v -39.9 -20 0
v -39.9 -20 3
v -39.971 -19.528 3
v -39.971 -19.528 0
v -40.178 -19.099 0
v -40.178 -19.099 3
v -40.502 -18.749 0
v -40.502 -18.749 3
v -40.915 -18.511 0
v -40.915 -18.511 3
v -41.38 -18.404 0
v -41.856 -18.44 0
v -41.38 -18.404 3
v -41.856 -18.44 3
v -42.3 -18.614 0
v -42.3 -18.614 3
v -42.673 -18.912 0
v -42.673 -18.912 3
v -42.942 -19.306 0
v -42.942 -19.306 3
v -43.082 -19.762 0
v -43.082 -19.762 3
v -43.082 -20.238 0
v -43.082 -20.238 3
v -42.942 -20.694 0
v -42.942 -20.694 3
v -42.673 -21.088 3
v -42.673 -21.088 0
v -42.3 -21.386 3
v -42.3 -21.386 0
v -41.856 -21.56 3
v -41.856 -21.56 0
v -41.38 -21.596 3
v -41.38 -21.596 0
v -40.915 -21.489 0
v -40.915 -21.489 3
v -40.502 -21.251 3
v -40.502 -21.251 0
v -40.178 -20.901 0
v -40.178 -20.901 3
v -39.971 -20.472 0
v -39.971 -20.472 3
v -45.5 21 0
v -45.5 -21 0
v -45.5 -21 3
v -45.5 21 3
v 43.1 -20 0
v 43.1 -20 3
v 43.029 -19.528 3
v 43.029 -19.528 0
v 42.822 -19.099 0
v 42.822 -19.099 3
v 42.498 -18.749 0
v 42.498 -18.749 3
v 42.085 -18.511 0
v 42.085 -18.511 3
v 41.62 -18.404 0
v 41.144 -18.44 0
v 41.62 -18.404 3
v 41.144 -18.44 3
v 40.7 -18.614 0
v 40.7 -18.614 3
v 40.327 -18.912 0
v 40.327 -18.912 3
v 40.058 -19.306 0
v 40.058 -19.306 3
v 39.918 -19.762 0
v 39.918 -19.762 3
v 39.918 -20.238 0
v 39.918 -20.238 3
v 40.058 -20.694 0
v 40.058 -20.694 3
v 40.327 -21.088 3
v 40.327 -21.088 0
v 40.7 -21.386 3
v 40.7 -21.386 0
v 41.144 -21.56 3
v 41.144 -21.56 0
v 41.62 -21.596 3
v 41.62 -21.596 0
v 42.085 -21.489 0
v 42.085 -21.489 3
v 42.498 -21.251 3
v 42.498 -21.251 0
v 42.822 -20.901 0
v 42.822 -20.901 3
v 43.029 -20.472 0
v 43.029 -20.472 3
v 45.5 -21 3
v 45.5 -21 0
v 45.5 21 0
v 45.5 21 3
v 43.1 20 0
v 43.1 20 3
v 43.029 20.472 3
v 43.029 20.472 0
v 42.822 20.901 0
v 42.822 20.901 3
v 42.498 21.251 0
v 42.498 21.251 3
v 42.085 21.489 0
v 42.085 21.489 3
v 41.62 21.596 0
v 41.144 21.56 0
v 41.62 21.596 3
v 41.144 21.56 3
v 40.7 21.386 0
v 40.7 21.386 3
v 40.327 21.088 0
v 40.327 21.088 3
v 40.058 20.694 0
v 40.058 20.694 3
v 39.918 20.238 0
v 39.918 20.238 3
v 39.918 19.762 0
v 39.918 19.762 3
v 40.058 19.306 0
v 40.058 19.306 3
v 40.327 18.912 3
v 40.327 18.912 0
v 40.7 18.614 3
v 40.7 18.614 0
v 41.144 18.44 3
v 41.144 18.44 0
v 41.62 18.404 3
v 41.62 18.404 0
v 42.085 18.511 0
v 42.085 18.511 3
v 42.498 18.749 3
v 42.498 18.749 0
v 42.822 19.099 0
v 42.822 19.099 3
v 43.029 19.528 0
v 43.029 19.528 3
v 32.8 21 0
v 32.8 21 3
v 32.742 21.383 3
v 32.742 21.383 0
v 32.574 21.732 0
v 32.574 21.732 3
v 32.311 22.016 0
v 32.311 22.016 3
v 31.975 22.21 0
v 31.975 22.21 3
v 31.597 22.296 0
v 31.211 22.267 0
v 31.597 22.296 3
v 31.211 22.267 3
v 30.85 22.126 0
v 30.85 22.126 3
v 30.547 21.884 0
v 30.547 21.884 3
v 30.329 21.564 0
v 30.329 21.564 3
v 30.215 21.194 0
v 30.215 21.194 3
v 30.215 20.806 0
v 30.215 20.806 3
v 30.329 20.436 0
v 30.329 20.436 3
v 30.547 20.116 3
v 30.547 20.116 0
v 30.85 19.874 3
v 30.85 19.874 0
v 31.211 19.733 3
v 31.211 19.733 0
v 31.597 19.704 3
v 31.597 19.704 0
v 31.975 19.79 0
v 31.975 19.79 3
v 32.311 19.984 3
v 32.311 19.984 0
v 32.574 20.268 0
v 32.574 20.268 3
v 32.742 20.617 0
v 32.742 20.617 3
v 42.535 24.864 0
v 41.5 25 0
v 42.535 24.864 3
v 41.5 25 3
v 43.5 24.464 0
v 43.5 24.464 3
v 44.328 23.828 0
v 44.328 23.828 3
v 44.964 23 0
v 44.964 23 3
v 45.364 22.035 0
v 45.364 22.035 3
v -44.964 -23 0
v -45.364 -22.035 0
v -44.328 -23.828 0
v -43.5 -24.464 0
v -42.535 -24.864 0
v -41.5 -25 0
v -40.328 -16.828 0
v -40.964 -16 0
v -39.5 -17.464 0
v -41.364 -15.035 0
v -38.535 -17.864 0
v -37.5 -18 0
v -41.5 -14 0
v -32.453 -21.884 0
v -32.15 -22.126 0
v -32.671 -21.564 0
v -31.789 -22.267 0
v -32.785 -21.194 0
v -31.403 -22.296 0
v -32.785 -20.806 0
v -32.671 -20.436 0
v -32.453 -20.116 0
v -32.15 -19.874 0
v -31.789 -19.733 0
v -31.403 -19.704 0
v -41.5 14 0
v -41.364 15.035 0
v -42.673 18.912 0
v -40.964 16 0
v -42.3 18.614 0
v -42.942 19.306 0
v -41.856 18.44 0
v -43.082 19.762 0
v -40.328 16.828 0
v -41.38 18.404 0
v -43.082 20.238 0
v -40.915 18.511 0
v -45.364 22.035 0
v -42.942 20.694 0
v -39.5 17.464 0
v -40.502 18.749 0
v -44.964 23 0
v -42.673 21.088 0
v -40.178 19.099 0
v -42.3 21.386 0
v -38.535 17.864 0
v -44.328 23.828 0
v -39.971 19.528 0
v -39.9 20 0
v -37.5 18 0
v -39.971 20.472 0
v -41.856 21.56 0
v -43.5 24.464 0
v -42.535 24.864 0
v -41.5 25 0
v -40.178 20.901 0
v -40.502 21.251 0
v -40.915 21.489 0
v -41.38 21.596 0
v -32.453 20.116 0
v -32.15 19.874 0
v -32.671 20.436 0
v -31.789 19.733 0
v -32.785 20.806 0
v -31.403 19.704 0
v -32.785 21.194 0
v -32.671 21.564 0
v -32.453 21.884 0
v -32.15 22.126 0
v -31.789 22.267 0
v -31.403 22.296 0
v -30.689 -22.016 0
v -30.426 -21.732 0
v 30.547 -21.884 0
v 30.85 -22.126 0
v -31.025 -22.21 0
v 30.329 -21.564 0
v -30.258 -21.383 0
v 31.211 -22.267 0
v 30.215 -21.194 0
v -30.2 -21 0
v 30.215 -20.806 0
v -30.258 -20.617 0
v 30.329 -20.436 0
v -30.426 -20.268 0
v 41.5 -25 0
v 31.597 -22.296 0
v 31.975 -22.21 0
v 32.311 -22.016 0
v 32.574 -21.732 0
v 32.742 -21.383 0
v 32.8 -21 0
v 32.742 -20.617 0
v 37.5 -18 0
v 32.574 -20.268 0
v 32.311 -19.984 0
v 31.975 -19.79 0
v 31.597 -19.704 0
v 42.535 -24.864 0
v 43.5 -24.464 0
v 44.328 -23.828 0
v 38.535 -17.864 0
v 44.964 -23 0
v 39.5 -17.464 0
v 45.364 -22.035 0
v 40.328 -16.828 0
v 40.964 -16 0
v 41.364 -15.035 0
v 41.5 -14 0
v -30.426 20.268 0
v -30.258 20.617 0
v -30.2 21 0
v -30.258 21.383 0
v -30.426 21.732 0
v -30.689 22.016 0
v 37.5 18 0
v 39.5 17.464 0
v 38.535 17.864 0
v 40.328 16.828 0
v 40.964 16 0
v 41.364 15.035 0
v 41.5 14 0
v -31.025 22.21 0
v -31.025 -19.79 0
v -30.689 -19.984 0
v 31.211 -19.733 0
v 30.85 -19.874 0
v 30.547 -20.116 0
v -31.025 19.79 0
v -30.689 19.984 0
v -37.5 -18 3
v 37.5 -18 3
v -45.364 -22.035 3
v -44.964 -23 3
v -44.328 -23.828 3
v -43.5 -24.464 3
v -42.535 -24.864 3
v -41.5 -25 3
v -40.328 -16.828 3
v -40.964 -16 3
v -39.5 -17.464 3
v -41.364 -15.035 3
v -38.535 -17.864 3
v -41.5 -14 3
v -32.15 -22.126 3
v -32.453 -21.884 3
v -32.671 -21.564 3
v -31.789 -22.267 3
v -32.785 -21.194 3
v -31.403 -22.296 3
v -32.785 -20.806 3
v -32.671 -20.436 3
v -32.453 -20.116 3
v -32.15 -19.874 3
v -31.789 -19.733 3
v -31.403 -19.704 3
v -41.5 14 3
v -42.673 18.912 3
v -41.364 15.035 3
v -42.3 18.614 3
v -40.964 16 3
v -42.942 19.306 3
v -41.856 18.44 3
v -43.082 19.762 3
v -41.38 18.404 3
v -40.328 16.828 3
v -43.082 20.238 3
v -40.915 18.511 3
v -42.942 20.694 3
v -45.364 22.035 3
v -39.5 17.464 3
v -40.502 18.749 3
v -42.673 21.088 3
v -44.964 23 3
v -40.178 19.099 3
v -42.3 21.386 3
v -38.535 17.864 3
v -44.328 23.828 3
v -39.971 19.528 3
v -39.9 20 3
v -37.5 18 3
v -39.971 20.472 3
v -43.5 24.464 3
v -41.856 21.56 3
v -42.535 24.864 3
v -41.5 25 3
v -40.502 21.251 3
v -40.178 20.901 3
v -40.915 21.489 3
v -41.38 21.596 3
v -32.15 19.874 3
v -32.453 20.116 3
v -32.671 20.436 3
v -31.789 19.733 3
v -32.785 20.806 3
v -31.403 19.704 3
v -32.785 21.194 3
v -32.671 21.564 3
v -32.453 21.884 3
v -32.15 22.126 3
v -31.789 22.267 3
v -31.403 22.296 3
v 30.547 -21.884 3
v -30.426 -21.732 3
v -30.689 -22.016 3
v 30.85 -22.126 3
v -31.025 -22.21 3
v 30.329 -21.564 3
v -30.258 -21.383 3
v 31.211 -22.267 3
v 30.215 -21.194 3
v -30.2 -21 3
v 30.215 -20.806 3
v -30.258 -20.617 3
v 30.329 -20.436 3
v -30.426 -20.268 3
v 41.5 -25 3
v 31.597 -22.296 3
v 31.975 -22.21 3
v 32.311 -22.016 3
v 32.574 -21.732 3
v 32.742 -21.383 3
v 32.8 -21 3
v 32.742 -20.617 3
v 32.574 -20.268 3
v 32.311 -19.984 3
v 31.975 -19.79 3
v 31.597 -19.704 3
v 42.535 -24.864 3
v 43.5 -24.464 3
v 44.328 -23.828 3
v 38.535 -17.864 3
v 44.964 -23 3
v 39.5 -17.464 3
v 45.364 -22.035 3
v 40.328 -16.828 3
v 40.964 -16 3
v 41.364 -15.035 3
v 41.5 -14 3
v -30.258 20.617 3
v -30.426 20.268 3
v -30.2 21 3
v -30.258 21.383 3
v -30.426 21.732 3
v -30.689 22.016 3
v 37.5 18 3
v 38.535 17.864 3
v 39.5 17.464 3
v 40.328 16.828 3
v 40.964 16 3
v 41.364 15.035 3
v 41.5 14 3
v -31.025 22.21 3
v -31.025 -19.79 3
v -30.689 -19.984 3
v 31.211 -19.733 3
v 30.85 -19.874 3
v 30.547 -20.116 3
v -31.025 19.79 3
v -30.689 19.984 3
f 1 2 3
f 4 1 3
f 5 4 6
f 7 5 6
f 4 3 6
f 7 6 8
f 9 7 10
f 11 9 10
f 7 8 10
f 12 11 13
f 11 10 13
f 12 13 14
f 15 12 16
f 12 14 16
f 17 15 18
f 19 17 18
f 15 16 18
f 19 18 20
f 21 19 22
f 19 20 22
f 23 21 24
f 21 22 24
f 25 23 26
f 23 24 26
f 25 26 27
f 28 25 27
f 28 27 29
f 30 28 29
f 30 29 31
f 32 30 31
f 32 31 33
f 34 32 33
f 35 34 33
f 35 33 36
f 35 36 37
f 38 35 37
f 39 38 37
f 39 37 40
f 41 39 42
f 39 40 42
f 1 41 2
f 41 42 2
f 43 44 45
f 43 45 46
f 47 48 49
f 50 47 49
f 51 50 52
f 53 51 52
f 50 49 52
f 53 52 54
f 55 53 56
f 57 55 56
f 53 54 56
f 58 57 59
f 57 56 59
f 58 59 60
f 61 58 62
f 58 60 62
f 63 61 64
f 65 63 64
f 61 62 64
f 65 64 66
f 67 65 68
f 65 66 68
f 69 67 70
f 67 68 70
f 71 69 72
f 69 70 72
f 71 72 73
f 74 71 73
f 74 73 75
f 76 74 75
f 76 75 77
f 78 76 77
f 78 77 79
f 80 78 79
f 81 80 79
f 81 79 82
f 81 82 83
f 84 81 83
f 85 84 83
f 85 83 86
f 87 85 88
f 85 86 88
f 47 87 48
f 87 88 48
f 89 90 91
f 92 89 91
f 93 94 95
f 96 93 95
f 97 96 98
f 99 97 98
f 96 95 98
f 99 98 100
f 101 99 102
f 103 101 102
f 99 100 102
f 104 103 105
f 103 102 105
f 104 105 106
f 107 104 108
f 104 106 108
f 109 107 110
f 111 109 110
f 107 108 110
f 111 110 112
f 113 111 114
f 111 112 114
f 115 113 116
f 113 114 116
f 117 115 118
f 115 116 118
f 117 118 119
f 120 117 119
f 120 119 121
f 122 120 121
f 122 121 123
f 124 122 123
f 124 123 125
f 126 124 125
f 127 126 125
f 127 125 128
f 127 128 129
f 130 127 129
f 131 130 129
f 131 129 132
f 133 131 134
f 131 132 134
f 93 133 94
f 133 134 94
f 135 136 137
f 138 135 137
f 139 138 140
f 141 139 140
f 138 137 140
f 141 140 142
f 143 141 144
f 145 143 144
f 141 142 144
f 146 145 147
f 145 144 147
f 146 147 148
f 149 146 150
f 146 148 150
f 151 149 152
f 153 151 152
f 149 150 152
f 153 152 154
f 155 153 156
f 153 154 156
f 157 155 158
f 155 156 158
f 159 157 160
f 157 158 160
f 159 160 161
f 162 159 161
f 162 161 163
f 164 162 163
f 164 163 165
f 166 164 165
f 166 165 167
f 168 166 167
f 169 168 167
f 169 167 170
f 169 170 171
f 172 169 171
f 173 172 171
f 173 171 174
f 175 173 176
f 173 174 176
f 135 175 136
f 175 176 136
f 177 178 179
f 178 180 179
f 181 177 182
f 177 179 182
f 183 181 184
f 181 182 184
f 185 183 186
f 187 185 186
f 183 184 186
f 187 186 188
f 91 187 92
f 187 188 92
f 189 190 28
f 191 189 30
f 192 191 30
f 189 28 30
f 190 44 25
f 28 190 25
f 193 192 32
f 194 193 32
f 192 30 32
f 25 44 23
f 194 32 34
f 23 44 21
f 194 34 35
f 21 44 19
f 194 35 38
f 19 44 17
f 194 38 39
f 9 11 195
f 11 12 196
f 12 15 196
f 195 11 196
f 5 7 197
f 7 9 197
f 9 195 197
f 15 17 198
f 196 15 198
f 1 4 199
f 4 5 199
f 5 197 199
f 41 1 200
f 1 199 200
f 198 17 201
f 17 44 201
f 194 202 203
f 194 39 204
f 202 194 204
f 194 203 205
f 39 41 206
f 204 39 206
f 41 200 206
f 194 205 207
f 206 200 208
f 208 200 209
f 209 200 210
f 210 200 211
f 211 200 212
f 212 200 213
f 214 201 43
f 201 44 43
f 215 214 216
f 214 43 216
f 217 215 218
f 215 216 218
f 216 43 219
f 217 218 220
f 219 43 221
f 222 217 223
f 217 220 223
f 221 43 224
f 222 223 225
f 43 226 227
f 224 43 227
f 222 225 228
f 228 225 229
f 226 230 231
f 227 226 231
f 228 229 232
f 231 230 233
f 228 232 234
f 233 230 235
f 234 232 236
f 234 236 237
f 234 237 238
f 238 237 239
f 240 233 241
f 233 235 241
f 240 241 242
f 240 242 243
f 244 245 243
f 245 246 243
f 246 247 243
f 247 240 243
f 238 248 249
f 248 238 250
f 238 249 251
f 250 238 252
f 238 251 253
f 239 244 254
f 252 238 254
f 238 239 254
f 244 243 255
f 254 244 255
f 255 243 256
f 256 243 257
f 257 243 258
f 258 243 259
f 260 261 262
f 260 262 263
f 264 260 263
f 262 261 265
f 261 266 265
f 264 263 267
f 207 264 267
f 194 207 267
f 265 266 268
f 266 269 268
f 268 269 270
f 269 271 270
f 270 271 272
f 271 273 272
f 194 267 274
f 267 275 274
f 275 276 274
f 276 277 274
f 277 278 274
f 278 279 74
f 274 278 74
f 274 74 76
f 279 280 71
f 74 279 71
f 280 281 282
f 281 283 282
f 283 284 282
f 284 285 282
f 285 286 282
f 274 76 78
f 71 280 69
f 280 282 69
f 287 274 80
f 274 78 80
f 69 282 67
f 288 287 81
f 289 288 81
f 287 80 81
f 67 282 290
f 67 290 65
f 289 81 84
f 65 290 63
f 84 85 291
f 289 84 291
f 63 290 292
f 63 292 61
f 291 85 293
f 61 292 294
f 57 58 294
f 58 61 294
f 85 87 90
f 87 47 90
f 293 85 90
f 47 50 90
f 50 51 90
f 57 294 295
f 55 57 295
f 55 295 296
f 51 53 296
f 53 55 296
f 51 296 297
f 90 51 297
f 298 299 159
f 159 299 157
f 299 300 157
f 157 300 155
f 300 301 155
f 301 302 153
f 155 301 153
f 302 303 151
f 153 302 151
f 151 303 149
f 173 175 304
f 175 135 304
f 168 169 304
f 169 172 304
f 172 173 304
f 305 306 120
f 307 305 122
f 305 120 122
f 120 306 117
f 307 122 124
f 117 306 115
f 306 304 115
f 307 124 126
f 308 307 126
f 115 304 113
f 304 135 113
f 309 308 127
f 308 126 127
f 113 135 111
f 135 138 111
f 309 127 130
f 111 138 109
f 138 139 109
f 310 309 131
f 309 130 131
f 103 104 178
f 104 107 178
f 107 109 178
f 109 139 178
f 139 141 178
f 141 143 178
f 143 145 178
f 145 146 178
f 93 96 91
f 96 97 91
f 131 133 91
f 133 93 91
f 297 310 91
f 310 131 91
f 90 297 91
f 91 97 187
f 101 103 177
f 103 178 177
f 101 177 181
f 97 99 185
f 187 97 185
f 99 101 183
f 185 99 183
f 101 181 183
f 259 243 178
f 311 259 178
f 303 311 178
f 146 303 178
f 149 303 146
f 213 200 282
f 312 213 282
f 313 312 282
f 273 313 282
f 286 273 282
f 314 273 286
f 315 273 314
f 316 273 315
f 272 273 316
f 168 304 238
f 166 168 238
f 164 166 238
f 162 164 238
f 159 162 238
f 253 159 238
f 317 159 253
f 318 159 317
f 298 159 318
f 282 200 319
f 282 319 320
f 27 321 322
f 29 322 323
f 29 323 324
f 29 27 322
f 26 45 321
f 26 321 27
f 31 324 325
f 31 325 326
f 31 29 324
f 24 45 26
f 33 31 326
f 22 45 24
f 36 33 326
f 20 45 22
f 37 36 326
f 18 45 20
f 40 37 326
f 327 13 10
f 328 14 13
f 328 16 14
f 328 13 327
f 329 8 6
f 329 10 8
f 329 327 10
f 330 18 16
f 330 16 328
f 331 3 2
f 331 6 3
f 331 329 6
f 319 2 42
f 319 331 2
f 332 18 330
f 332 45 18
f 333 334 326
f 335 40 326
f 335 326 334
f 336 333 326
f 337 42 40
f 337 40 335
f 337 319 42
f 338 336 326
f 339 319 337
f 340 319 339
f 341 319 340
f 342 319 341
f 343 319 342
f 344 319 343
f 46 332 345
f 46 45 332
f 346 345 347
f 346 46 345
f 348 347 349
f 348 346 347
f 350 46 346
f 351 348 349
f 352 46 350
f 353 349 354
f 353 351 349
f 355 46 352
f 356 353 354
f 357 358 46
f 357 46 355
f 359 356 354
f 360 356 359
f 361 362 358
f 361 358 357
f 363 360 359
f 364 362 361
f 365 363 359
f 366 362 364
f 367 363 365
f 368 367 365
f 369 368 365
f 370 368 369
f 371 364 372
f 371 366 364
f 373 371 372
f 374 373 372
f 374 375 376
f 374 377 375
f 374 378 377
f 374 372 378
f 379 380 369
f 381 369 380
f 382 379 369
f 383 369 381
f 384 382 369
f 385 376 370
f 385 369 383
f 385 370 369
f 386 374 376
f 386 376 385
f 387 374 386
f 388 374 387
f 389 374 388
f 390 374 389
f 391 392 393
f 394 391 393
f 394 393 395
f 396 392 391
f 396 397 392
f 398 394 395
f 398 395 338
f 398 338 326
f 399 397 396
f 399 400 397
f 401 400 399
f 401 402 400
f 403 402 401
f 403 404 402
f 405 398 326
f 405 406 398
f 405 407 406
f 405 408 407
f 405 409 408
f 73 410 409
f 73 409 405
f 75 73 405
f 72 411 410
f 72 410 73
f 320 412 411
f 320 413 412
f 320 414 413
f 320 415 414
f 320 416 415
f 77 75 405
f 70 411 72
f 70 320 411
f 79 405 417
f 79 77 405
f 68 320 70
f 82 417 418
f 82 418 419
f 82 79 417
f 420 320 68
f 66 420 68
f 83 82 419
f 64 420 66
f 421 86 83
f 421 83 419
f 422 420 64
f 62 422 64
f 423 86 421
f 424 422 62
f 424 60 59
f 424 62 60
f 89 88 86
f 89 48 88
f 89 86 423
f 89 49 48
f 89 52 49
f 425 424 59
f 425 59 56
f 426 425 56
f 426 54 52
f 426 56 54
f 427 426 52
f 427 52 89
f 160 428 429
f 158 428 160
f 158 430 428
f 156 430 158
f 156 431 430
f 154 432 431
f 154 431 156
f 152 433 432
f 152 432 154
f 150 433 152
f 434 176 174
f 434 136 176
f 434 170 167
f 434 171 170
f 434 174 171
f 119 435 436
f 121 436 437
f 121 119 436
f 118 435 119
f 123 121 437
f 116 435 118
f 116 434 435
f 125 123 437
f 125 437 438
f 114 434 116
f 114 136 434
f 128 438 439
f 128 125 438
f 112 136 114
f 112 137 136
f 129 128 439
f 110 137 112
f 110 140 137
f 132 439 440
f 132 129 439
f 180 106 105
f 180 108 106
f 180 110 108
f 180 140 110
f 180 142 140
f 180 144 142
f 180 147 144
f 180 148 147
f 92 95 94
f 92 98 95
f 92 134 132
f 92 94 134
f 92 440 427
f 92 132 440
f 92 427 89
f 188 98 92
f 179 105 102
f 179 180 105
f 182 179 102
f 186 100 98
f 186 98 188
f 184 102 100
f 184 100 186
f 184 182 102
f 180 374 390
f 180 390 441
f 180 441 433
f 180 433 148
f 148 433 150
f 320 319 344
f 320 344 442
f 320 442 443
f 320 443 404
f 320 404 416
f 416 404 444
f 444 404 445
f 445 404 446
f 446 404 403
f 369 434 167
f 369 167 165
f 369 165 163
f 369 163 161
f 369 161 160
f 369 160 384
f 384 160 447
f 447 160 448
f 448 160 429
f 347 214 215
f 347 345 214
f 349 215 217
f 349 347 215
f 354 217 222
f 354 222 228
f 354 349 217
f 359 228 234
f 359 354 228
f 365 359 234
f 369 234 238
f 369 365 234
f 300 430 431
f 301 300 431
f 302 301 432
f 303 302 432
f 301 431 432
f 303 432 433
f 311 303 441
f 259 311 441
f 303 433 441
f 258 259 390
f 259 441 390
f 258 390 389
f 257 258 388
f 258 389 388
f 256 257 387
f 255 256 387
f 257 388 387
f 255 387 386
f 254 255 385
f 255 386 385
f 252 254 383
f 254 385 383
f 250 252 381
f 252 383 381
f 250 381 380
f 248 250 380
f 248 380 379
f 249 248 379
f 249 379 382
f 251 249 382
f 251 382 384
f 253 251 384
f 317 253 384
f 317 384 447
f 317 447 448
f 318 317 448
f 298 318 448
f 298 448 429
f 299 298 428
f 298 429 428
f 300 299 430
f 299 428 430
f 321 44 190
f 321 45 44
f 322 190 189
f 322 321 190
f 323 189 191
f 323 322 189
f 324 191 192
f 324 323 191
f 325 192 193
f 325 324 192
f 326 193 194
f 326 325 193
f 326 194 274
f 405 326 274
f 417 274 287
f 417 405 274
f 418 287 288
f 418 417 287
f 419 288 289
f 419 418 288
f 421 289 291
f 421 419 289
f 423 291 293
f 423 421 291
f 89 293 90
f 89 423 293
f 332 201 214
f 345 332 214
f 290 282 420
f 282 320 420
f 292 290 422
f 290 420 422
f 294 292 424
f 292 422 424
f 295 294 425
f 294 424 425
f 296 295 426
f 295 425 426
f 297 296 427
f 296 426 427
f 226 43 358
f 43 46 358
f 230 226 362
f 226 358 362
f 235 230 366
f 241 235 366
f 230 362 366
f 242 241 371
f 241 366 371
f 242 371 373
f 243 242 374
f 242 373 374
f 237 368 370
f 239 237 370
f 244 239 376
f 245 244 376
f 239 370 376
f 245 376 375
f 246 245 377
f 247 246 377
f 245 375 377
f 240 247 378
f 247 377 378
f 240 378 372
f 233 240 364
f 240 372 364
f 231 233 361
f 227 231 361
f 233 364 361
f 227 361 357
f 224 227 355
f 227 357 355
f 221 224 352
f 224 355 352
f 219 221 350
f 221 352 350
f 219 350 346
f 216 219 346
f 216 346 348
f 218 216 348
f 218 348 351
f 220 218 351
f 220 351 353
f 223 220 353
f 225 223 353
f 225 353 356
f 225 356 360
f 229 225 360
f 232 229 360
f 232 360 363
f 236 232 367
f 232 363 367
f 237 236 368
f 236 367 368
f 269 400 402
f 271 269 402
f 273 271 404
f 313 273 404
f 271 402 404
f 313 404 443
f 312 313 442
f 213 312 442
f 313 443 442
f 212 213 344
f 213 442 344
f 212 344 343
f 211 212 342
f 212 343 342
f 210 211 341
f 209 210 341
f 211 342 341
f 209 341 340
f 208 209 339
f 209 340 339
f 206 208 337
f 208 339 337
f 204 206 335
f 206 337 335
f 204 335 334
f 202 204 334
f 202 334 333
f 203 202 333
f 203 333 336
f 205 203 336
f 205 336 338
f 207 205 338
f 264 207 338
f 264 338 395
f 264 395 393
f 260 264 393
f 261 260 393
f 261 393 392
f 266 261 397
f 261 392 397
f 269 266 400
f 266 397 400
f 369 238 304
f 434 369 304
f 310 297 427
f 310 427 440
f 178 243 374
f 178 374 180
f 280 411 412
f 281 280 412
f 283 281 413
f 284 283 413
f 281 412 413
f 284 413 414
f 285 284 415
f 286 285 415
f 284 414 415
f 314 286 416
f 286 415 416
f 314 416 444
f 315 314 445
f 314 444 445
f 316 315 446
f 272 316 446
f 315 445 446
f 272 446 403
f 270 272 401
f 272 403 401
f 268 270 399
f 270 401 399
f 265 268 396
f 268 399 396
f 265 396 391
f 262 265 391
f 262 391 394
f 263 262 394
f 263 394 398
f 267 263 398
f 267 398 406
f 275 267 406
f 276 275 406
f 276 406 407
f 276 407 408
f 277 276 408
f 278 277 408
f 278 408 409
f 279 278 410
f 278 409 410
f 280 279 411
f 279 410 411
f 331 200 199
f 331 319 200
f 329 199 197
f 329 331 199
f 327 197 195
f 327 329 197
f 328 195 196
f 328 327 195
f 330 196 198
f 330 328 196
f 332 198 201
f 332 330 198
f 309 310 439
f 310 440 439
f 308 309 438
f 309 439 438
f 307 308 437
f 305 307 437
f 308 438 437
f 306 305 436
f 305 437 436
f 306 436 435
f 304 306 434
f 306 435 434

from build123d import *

# Parameters (mm, degrees)
SKETCH_1_W          = 91
SKETCH_1_H          = 50
SKETCH_1_W_2        = 83
SKETCH_1_H_2        = 36
EXTRUDE_1_DEPTH     = 3
SKETCH_2_R          = 1.3
CUT_EXTRUDE_1_DEPTH = 3
SKETCH_3_R          = 1.6
CUT_EXTRUDE_2_DEPTH = 3
FILLET_1_R          = 4
SKETCH_4_W          = 30
SKETCH_4_H          = 35
EXTRUDE_2_DEPTH     = 3
SKETCH_5_R          = 1.25
CUT_EXTRUDE_3_DEPTH = 10
FILLET_2_R          = 3
SKETCH_6_W          = 18
SKETCH_6_H          = 27
CUT_EXTRUDE_4_DEPTH = 10
FILLET_3_R          = 2
SKETCH_7_W          = 38
SKETCH_7_H          = 10
SKETCH_7_R          = 1.6
EXTRUDE_3_DEPTH     = 3
FILLET_4_R          = 2
FILLET_5_R          = 2
SKETCH_8_W          = 42
SKETCH_8_H          = 10
CUT_EXTRUDE_5_DEPTH = 10
SKETCH_9_W          = 30
SKETCH_9_H          = 41
CUT_EXTRUDE_6_DEPTH = 10


with BuildPart() as part:
    # 草图1 → 凸台-拉伸1 (new body)
    with BuildSketch(Plane.XY):
        Rectangle(SKETCH_1_W, SKETCH_1_H)
        Rectangle(SKETCH_1_W_2, SKETCH_1_H_2, mode=Mode.SUBTRACT)
    extrude(amount=EXTRUDE_1_DEPTH)

    # 草图2 → 切除-拉伸1 (cut)
    with BuildSketch(Plane.XY.offset(3)):
        with Locations((31.5, 21)):
            Circle(SKETCH_2_R)
        with Locations((31.5, -21)):
            Circle(SKETCH_2_R)
        with Locations((-31.5, -21)):
            Circle(SKETCH_2_R)
        with Locations((-31.5, 21)):
            Circle(SKETCH_2_R)
    extrude(amount=-CUT_EXTRUDE_1_DEPTH, mode=Mode.SUBTRACT)

    # 草图3 → 切除-拉伸2 (cut)
    with BuildSketch(Plane.XY.offset(3)):
        with Locations((41.5, 20)):
            Circle(SKETCH_3_R)
        with Locations((41.5, -20)):
            Circle(SKETCH_3_R)
        with Locations((-41.5, -20)):
            Circle(SKETCH_3_R)
        with Locations((-41.5, 20)):
            Circle(SKETCH_3_R)
    extrude(amount=-CUT_EXTRUDE_2_DEPTH, mode=Mode.SUBTRACT)

    # 圆角1
    fillet_1_edges = [part.edges().sort_by_distance(p)[0] for p in [
        (41.5, -18, 1.5),
        (41.5, 18, 1.5),
        (-41.5, 18, 1.5),
        (-41.5, -18, 1.5),
        (45.5, -25, 1.5),
        (-45.5, -25, 1.5),
        (-45.5, 25, 1.5),
        (45.5, 25, 1.5),
    ]]
    fillet(fillet_1_edges, radius=FILLET_1_R)

    # 草图4 → 凸台-拉伸2 (add)
    with BuildSketch(Plane(origin=(0, 0, 0), x_dir=(-1, 0, 0), z_dir=(0, 0, -1))):
        with Locations((-60.5, 0)):
            Rectangle(SKETCH_4_W, SKETCH_4_H)
    extrude(amount=-EXTRUDE_2_DEPTH)

    # 草图5 → 切除-拉伸3 (cut)
    with BuildSketch(Plane(origin=(0, 0, 0), x_dir=(-1, 0, 0), z_dir=(0, 0, -1))):
        with Locations((-70.5, -12)):
            Circle(SKETCH_5_R)
        with Locations((-70.5, 12)):
            Circle(SKETCH_5_R)
    extrude(amount=-CUT_EXTRUDE_3_DEPTH, mode=Mode.SUBTRACT)

    # 圆角2
    fillet_2_edges = [part.edges().sort_by_distance(p)[0] for p in [
        (45.5, 17.5, 1.5),
        (45.5, -17.5, 1.5),
        (75.5, -17.5, 1.5),
        (75.5, 17.5, 1.5),
    ]]
    fillet(fillet_2_edges, radius=FILLET_2_R)

    # 草图6 → 切除-拉伸4 (cut)
    with BuildSketch(Plane(origin=(0, 0, 0), x_dir=(-1, 0, 0), z_dir=(0, 0, -1))):
        with Locations((-57.5, 0)):
            Rectangle(SKETCH_6_W, SKETCH_6_H)
    extrude(amount=-CUT_EXTRUDE_4_DEPTH, mode=Mode.SUBTRACT)

    # 圆角3
    fillet_3_edges = [part.edges().sort_by_distance(p)[0] for p in [
        (66.5, -13.5, 1.5),
        (66.5, 13.5, 1.5),
        (48.5, 13.5, 1.5),
        (48.5, -13.5, 1.5),
    ]]
    fillet(fillet_3_edges, radius=FILLET_3_R)

    # 草图7 → 凸台-拉伸3 (add)
    with BuildSketch(Plane(origin=(0, 0, 0), x_dir=(-1, 0, 0), z_dir=(0, 0, -1))):
        with Locations((0, 30)):
            Rectangle(SKETCH_7_W, SKETCH_7_H)
        with Locations((-16, 32)):
            Circle(SKETCH_7_R, mode=Mode.SUBTRACT)
        with Locations((16, 32)):
            Circle(SKETCH_7_R, mode=Mode.SUBTRACT)
        with Locations((0, -30)):
            Rectangle(SKETCH_7_W, SKETCH_7_H)
        with Locations((16, -32)):
            Circle(SKETCH_7_R, mode=Mode.SUBTRACT)
        with Locations((-16, -32)):
            Circle(SKETCH_7_R, mode=Mode.SUBTRACT)
    extrude(amount=-EXTRUDE_3_DEPTH)

    # 圆角4
    fillet_4_edges = [part.edges().sort_by_distance(p)[0] for p in [
        (19, 35, 1.5),
        (-19, 35, 1.5),
        (-19, -35, 1.5),
        (19, -35, 1.5),
    ]]
    fillet(fillet_4_edges, radius=FILLET_4_R)

    # 圆角5
    fillet_5_edges = [part.edges().sort_by_distance(p)[0] for p in [
        (19, 25, 1.5),
        (-19, 25, 1.5),
        (-19, -25, 1.5),
        (19, -25, 1.5),
    ]]
    fillet(fillet_5_edges, radius=FILLET_5_R)

    # 草图8 → 切除-拉伸5 (cut)
    with BuildSketch(Plane.XY.offset(3)):
        with Locations((0, 30)):
            Rectangle(SKETCH_8_W, SKETCH_8_H)
        with Locations((0, -30)):
            Rectangle(SKETCH_8_W, SKETCH_8_H)
    extrude(amount=-CUT_EXTRUDE_5_DEPTH, mode=Mode.SUBTRACT)

    # 草图9 → 切除-拉伸6 (cut)
    with BuildSketch(Plane.XY.offset(3)):
        with Locations((60.5, 0)):
            Rectangle(SKETCH_9_W, SKETCH_9_H)
    extrude(amount=-CUT_EXTRUDE_6_DEPTH, mode=Mode.SUBTRACT)


solid = part.part
